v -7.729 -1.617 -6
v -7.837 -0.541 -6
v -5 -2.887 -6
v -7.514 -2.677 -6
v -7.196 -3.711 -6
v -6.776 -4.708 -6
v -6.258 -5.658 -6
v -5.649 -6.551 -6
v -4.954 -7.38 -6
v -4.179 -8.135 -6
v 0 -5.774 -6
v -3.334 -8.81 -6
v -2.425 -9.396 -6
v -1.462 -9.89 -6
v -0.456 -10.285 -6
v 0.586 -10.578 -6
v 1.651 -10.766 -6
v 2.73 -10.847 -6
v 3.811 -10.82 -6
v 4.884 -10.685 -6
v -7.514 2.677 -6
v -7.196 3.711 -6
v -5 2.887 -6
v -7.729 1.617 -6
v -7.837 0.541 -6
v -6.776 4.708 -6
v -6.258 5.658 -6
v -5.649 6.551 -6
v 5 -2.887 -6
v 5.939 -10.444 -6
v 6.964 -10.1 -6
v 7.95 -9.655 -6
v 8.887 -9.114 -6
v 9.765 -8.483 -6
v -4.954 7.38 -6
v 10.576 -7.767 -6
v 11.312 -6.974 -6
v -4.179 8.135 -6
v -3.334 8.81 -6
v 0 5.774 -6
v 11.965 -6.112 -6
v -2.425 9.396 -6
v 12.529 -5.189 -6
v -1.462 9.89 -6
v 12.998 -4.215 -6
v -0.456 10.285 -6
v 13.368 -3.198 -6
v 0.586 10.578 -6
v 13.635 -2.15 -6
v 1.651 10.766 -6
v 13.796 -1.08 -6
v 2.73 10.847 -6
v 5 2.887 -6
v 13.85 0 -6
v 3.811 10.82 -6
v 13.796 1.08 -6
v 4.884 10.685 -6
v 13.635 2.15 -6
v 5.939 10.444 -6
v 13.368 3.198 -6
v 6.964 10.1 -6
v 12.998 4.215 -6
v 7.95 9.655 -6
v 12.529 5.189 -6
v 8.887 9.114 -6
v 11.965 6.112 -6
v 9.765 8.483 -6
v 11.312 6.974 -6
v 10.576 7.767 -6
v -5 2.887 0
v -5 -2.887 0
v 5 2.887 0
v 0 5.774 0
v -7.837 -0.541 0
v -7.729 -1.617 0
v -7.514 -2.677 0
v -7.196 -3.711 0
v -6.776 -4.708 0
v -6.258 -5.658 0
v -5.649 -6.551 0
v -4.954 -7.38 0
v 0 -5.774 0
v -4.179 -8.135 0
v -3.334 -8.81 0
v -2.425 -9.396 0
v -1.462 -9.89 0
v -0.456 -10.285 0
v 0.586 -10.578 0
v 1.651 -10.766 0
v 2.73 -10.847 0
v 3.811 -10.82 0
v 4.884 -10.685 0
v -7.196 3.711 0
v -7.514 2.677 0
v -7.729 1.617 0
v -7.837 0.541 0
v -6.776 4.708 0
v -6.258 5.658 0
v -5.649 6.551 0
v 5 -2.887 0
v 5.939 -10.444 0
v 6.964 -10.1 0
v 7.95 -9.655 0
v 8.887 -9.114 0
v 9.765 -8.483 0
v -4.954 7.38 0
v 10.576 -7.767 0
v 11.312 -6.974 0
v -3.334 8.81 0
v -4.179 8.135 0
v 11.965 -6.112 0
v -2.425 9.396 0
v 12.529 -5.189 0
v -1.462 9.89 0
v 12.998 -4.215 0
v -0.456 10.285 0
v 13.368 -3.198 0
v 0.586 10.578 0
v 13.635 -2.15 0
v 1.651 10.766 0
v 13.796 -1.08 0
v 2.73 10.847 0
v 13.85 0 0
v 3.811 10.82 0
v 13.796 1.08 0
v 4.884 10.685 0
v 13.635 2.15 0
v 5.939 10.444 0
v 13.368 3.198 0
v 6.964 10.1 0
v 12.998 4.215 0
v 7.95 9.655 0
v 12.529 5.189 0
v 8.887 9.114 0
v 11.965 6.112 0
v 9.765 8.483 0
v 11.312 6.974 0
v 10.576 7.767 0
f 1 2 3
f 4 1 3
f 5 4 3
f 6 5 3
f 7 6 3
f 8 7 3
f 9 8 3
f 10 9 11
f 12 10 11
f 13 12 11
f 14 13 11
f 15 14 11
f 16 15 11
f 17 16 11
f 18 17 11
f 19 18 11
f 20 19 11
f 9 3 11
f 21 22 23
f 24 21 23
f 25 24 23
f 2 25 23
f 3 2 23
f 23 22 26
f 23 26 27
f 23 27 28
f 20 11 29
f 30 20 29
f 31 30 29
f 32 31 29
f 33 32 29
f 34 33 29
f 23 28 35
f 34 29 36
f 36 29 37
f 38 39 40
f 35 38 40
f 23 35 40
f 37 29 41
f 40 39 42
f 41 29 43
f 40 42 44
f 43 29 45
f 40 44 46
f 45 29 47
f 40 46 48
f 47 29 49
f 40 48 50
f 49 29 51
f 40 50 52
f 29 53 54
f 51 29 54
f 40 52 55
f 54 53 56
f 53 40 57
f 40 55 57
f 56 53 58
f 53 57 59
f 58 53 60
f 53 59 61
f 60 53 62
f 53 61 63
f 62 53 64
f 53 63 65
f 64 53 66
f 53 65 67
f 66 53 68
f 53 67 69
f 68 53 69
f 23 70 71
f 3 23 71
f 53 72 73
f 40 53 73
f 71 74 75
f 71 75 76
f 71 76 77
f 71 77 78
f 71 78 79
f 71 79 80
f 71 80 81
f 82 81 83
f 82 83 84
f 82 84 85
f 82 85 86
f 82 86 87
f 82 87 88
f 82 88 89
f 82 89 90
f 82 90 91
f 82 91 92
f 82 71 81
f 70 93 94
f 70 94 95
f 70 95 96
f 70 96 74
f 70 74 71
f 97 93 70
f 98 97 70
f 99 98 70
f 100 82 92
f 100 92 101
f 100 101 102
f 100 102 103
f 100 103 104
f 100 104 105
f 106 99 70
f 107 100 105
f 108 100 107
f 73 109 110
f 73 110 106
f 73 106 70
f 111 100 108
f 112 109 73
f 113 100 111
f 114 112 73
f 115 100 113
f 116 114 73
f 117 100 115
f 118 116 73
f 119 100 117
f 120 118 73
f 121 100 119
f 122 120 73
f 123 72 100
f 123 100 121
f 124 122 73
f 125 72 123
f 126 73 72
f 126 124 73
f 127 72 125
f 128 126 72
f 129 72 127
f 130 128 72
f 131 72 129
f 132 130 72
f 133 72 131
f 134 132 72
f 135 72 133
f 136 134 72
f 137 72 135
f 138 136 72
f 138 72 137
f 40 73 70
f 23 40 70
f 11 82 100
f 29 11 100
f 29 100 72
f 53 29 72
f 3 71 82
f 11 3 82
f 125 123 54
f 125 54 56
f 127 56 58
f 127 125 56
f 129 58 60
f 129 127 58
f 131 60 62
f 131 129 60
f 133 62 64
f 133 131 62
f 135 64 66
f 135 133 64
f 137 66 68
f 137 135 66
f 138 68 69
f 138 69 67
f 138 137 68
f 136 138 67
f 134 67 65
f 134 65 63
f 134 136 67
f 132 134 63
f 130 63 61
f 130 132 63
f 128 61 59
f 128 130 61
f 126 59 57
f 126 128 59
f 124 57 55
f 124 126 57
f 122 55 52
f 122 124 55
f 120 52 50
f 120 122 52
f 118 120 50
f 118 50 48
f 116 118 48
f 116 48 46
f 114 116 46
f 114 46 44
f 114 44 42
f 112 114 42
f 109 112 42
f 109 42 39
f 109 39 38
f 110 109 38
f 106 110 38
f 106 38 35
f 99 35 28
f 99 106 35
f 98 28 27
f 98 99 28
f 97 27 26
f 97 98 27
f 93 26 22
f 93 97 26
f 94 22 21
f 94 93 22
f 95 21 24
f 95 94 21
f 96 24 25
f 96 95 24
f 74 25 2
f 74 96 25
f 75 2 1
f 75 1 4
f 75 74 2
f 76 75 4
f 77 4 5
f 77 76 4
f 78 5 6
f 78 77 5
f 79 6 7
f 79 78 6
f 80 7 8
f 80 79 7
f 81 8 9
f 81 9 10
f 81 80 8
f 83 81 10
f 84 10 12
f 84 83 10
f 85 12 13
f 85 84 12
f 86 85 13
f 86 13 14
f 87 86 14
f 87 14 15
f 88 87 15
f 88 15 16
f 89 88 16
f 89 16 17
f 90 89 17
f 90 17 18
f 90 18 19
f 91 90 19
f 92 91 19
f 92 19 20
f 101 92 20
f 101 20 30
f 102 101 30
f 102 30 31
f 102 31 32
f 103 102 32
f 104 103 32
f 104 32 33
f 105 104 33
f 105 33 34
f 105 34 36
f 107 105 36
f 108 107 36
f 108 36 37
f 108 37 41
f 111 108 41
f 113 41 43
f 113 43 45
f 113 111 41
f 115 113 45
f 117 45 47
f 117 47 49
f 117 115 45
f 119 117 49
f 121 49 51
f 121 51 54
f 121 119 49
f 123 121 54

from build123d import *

# Parameters (mm, degrees)
SKETCH1_R           = 10.85
BOSS_EXTRUDE1_DEPTH = 6


with BuildPart() as part:
    # Sketch1 → Boss-Extrude1 (new body)
    with BuildSketch(Plane.XY):
        with Locations((3, 0)):
            Circle(SKETCH1_R)
        Polygon((0, 5.773502692), (-5, 2.886751346), (-5, -2.886751346), (0, -5.773502692), (5, -2.886751346), (5, 2.886751346), align=None, mode=Mode.SUBTRACT)
    extrude(amount=-BOSS_EXTRUDE1_DEPTH)


solid = part.part
